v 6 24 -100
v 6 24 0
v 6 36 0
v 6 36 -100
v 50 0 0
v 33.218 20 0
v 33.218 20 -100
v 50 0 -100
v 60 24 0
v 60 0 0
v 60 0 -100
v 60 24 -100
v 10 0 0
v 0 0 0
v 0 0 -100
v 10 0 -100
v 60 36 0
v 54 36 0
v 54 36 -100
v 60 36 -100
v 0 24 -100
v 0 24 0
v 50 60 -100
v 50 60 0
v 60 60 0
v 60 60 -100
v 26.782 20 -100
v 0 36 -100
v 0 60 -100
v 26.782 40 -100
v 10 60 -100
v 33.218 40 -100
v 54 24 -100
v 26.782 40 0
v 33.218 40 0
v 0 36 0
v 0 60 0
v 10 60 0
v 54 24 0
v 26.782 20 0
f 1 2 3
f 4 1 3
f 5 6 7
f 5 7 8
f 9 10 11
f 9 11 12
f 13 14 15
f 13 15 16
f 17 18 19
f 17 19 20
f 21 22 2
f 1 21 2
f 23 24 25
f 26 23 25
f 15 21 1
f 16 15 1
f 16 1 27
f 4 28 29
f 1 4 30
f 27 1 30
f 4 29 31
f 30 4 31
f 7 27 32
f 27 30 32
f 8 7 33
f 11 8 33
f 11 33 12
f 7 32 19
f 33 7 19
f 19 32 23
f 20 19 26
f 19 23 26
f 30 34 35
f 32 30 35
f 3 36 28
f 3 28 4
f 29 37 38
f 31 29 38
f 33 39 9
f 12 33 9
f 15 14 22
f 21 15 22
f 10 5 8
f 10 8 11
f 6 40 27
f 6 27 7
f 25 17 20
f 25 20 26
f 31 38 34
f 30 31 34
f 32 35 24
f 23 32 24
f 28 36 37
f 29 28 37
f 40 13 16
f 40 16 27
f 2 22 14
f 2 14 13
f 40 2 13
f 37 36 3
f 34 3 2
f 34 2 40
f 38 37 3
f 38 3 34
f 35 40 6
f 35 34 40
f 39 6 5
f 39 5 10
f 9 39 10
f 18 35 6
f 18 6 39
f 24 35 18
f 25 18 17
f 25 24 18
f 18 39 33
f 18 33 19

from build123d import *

# Parameters (mm, degrees)
SKETCH1_W           = 60
SKETCH1_H           = 60
BOSS_EXTRUDE1_DEPTH = 100
SKETCH3_W           = 6
SKETCH3_H           = 12
CUT_EXTRUDE2_DEPTH  = 101


with BuildPart() as part:
    # Sketch1 → Boss-Extrude1 (new body)
    with BuildSketch(Plane.XY):
        with Locations((30, 30)):
            Rectangle(SKETCH1_W, SKETCH1_H)
    extrude(amount=-BOSS_EXTRUDE1_DEPTH)

    # Sketch3 → Cut-Extrude2 (cut, through all)
    with BuildSketch(Plane.XY):
        Polygon((26.781992624, 20), (33.218007376, 20), (50, 0), (10, 0), align=None)
        Polygon((26.781992624, 40), (33.218007376, 40), (50, 60), (10, 60), align=None)
        with Locations((57, 30)):
            Rectangle(SKETCH3_W, SKETCH3_H)
        with Locations((3, 30)):
            Rectangle(SKETCH3_W, SKETCH3_H)
    extrude(amount=-CUT_EXTRUDE2_DEPTH, mode=Mode.SUBTRACT)


solid = part.part
